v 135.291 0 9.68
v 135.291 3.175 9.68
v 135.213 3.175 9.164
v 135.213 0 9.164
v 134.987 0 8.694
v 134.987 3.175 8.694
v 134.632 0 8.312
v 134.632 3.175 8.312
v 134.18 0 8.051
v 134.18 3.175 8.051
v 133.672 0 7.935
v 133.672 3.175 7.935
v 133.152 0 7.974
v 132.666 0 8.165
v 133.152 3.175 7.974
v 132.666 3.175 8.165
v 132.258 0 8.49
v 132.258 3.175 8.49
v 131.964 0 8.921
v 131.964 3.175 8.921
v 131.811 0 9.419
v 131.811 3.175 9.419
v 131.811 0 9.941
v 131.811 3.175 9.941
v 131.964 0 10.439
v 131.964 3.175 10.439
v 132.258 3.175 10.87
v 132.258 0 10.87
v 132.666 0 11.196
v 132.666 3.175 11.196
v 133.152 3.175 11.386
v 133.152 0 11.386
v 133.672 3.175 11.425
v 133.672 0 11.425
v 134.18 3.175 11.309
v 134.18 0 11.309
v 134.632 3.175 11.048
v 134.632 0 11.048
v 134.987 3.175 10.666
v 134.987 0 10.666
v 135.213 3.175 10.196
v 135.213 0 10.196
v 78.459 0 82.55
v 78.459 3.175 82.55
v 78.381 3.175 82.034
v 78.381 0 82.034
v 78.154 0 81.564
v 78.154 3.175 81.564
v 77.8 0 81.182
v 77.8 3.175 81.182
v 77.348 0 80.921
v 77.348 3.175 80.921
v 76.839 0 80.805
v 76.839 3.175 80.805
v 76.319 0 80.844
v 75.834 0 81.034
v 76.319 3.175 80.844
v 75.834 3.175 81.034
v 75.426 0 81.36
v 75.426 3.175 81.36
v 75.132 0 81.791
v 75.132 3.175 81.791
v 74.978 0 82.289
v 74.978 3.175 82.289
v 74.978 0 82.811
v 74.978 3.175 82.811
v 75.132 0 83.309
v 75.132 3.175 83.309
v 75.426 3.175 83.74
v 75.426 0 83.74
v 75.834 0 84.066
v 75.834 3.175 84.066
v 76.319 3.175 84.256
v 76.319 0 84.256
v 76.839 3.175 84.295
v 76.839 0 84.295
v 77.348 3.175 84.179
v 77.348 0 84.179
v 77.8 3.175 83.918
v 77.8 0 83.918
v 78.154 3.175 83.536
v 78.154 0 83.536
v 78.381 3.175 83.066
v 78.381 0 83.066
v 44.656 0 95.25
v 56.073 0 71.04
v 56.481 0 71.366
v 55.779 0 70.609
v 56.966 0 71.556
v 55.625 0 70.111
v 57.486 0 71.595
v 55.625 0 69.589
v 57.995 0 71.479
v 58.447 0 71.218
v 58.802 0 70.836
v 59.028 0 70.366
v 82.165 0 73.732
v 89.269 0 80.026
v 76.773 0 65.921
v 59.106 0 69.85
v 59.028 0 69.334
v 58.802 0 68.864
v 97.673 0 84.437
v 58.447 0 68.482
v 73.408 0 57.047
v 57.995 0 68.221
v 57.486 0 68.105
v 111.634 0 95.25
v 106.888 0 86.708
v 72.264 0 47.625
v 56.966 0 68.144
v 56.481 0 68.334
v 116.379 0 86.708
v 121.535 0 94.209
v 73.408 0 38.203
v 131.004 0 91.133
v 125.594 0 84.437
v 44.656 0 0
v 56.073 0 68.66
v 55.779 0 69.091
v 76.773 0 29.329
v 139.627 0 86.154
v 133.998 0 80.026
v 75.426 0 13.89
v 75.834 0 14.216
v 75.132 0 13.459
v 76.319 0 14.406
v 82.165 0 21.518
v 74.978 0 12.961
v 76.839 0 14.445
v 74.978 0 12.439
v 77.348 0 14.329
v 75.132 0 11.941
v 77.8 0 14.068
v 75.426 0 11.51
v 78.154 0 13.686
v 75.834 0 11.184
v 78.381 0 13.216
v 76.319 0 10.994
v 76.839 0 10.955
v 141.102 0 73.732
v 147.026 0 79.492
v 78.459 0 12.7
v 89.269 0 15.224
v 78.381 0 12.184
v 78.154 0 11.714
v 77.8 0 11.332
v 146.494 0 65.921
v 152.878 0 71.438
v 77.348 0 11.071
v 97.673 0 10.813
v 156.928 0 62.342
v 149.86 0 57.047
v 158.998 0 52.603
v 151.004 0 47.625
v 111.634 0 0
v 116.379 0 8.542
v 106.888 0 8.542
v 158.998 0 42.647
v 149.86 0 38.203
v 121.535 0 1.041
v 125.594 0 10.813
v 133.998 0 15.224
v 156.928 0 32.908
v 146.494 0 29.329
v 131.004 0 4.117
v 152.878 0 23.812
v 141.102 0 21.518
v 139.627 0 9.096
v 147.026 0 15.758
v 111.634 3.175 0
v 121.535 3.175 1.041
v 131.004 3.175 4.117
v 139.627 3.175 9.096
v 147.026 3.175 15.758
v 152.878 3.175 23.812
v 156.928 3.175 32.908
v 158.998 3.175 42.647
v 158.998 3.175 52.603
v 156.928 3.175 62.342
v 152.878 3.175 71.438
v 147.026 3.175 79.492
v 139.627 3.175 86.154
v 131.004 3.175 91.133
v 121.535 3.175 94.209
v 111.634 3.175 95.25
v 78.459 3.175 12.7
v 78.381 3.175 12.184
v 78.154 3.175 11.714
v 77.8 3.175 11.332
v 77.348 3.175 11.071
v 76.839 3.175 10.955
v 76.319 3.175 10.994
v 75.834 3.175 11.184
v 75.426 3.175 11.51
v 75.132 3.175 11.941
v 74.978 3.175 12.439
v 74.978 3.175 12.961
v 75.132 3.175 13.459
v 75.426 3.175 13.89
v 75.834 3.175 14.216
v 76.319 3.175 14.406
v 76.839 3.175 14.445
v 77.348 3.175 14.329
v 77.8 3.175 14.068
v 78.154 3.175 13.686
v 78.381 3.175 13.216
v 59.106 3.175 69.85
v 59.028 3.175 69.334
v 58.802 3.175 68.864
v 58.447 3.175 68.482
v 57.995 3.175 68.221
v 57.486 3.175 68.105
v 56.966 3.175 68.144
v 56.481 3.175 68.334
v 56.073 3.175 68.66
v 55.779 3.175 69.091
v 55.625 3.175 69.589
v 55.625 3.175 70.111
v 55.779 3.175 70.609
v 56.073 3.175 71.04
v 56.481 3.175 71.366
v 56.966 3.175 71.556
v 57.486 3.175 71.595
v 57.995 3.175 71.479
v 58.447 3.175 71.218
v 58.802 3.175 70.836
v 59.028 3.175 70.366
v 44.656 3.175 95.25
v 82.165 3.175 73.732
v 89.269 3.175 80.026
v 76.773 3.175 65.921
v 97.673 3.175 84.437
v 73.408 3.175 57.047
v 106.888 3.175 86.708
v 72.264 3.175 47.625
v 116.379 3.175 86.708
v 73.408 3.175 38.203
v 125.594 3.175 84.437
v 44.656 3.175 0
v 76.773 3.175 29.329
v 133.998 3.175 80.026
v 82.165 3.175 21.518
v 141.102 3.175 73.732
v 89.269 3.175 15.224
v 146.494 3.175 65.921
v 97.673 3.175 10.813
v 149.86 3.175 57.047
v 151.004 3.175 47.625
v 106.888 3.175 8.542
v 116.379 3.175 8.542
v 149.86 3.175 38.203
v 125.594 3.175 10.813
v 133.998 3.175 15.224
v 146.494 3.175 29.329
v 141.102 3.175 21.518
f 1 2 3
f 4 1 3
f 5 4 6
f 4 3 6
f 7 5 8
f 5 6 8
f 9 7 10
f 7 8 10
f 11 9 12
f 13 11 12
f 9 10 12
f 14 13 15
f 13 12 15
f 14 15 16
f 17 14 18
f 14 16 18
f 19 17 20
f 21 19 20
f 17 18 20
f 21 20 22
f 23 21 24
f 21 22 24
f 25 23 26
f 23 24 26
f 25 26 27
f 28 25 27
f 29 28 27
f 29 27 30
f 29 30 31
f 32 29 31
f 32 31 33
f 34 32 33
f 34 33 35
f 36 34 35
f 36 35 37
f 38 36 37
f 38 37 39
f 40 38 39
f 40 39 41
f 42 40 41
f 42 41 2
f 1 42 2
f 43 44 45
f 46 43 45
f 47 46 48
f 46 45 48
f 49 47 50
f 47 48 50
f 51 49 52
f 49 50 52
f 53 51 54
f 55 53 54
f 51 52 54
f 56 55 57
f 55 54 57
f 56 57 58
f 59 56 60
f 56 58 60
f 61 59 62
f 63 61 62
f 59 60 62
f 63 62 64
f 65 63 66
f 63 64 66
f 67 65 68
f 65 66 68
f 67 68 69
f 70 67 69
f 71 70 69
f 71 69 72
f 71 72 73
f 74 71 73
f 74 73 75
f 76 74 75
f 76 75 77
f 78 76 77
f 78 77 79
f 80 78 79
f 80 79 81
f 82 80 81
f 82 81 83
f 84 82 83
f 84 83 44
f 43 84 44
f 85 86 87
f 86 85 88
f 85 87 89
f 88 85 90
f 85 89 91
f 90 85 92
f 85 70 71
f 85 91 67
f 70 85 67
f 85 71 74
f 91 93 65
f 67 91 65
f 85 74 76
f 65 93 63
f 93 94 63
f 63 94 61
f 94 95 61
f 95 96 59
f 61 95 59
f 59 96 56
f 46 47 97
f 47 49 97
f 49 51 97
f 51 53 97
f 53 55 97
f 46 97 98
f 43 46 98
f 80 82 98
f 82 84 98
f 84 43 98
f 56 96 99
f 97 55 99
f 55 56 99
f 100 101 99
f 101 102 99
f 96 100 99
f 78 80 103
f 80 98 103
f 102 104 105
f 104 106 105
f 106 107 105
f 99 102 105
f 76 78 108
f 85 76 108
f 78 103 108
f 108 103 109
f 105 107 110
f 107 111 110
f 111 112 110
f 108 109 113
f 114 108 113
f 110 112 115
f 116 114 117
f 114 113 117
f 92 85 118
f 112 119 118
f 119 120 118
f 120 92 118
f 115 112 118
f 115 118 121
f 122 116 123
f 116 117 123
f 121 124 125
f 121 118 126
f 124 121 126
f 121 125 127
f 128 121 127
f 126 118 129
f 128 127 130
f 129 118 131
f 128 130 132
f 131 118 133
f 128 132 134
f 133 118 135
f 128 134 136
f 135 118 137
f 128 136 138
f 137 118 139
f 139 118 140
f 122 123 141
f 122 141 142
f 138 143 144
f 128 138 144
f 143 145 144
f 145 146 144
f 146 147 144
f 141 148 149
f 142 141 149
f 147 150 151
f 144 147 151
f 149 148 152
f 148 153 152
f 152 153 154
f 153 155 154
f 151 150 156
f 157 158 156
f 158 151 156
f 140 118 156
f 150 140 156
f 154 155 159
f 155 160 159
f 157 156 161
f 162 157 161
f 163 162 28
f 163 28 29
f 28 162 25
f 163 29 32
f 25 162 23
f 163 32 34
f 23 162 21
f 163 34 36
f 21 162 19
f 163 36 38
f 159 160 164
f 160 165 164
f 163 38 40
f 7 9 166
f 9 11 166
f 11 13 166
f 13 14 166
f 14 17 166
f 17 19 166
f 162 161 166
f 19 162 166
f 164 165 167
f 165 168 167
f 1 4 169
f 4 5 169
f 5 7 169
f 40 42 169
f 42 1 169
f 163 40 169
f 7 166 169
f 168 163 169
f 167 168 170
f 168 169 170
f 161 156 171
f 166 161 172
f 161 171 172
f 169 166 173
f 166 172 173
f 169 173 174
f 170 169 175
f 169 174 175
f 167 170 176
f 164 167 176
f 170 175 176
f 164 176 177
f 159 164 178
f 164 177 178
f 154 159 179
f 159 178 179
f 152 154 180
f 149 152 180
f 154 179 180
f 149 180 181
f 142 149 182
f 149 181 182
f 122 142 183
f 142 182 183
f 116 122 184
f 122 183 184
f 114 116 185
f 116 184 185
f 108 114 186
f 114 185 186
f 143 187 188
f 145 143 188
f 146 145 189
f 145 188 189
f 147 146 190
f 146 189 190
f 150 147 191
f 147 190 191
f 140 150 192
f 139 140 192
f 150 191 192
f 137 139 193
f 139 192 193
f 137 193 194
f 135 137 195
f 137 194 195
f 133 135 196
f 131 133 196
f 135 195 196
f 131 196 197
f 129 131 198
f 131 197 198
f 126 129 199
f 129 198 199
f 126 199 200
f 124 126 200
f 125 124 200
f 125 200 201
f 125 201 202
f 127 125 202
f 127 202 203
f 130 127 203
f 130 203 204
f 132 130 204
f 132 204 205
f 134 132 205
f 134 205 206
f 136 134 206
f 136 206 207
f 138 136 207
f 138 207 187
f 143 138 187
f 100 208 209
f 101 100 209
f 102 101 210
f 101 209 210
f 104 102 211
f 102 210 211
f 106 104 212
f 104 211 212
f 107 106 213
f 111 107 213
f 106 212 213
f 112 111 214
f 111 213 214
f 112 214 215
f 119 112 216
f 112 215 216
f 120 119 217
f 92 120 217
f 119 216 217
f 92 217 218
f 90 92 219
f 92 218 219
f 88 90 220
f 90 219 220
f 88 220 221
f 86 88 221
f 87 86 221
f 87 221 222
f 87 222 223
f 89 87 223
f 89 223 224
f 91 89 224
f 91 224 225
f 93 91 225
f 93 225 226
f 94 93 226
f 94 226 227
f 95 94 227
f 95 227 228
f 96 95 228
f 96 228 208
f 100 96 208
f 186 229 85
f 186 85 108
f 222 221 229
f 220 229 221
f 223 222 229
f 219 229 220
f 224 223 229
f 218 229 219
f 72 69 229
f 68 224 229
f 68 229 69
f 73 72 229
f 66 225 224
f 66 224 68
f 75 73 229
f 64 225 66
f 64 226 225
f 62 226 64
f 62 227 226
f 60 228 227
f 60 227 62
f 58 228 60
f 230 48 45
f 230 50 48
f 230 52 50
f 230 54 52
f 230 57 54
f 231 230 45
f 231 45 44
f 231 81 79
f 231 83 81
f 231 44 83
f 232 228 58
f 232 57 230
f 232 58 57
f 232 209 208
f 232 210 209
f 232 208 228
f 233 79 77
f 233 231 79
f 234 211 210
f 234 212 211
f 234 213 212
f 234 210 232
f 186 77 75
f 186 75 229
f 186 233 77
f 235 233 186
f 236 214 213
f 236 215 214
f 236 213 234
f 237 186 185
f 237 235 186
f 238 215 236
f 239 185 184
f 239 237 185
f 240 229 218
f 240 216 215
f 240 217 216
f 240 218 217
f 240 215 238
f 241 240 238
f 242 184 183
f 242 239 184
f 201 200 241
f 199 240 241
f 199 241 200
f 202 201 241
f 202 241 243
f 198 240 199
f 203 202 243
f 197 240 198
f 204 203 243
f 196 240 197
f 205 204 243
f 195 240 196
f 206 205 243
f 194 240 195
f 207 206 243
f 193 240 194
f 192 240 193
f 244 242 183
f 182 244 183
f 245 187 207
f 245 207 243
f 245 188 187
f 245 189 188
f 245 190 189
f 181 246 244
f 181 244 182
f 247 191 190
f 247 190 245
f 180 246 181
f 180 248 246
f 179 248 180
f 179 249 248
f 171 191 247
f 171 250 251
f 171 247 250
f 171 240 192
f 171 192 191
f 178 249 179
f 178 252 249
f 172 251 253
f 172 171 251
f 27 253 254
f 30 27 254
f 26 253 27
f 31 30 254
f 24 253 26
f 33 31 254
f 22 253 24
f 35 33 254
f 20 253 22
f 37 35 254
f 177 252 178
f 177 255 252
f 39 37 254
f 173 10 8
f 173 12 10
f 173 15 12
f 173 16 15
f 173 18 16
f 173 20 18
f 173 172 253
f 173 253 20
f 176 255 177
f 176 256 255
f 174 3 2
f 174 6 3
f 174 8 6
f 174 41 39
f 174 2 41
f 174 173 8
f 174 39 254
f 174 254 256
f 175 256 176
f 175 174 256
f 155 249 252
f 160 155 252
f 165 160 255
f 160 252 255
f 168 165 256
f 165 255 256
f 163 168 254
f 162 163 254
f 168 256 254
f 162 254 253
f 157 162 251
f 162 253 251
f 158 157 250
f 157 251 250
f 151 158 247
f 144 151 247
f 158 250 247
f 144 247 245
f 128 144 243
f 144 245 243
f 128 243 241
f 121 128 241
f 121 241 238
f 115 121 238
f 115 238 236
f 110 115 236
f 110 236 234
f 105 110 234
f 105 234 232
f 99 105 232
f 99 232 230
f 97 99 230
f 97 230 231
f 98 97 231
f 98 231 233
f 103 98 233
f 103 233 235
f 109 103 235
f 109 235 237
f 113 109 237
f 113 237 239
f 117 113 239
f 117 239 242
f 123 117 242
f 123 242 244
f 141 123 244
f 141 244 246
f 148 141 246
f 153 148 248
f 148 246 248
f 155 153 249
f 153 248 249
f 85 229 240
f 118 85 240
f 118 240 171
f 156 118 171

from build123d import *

# Parameters (mm, degrees)
SKETCH2_W           = 120.952956328
SKETCH2_H           = 3.175
BOSS_EXTRUDE1_DEPTH = 95.25
SKETCH3_R           = 39.37
CUT_EXTRUDE2_DEPTH  = 4.175
CUT_EXTRUDE3_DEPTH  = 4.175
SKETCH8_R           = 1.75
CUT_EXTRUDE7_DEPTH  = 4.175
SKETCH10_R          = 1.75
CUT_EXTRUDE9_DEPTH  = 4.175
SKETCH11_W          = 6.35
SKETCH11_H          = 95.25
CUT_EXTRUDE10_DEPTH = 4.175
SKETCH12_R          = 1.75
CUT_EXTRUDE11_DEPTH = 4.175


with BuildPart() as part:
    # Sketch2 → Boss-Extrude1 (new body)
    with BuildSketch(Plane.XY):
        with Locations((98.782063621, 1.5875)):
            Rectangle(SKETCH2_W, SKETCH2_H)
    extrude(amount=BOSS_EXTRUDE1_DEPTH)

    # Sketch3 → Cut-Extrude2 (cut, through all)
    with BuildSketch(Plane(origin=(0, 3.175, 0), x_dir=(1, 0, 0), z_dir=(0, 1, 0))):
        with Locations((111.633541785, -47.625)):
            Circle(SKETCH3_R)
    extrude(amount=-CUT_EXTRUDE2_DEPTH, mode=Mode.SUBTRACT)

    # Sketch4 → Cut-Extrude3 (cut, through all)
    with BuildSketch(Plane(origin=(0, 3.175, 0), x_dir=(1, 0, 0), z_dir=(0, 1, 0))):
        with BuildLine():
            Line((111.633541785, -95.25), (179.051442703, -95.25))
            Line((179.051442703, -95.25), (179.051442703, 0))
            Line((179.051442703, 0), (111.633541785, 0))
            ThreePointArc((111.633541785, 0), (159.258541785, -47.625), (111.633541785, -95.25))
        make_face()
    extrude(amount=-CUT_EXTRUDE3_DEPTH, mode=Mode.SUBTRACT)

    # Sketch8 → Cut-Extrude7 (cut, through all)
    with BuildSketch(Plane(origin=(0, 3.175, 0), x_dir=(1, 0, 0), z_dir=(0, 1, 0))):
        with Locations((76.708541785, -12.7)):
            Circle(SKETCH8_R)
        with Locations((76.708541785, -82.55)):
            Circle(SKETCH8_R)
    extrude(amount=-CUT_EXTRUDE7_DEPTH, mode=Mode.SUBTRACT)

    # Sketch10 → Cut-Extrude9 (cut, through all)
    with BuildSketch(Plane(origin=(0, 3.175, 0), x_dir=(1, 0, 0), z_dir=(0, 1, 0))):
        with Locations((133.541041785, -9.680096933)):
            Circle(SKETCH10_R)
    extrude(amount=-CUT_EXTRUDE9_DEPTH, mode=Mode.SUBTRACT)

    # Sketch11 → Cut-Extrude10 (cut, through all)
    with BuildSketch(Plane(origin=(0, 3.175, 0), x_dir=(1, 0, 0), z_dir=(0, 1, 0))):
        with Locations((41.480585457, -47.625)):
            Rectangle(SKETCH11_W, SKETCH11_H)
    extrude(amount=-CUT_EXTRUDE10_DEPTH, mode=Mode.SUBTRACT)

    # Sketch12 → Cut-Extrude11 (cut, through all)
    with BuildSketch(Plane(origin=(0, 3.175, 0), x_dir=(1, 0, 0), z_dir=(0, 1, 0))):
        with Locations((57.355585457, -69.85)):
            Circle(SKETCH12_R)
    extrude(amount=-CUT_EXTRUDE11_DEPTH, mode=Mode.SUBTRACT)


solid = part.part
